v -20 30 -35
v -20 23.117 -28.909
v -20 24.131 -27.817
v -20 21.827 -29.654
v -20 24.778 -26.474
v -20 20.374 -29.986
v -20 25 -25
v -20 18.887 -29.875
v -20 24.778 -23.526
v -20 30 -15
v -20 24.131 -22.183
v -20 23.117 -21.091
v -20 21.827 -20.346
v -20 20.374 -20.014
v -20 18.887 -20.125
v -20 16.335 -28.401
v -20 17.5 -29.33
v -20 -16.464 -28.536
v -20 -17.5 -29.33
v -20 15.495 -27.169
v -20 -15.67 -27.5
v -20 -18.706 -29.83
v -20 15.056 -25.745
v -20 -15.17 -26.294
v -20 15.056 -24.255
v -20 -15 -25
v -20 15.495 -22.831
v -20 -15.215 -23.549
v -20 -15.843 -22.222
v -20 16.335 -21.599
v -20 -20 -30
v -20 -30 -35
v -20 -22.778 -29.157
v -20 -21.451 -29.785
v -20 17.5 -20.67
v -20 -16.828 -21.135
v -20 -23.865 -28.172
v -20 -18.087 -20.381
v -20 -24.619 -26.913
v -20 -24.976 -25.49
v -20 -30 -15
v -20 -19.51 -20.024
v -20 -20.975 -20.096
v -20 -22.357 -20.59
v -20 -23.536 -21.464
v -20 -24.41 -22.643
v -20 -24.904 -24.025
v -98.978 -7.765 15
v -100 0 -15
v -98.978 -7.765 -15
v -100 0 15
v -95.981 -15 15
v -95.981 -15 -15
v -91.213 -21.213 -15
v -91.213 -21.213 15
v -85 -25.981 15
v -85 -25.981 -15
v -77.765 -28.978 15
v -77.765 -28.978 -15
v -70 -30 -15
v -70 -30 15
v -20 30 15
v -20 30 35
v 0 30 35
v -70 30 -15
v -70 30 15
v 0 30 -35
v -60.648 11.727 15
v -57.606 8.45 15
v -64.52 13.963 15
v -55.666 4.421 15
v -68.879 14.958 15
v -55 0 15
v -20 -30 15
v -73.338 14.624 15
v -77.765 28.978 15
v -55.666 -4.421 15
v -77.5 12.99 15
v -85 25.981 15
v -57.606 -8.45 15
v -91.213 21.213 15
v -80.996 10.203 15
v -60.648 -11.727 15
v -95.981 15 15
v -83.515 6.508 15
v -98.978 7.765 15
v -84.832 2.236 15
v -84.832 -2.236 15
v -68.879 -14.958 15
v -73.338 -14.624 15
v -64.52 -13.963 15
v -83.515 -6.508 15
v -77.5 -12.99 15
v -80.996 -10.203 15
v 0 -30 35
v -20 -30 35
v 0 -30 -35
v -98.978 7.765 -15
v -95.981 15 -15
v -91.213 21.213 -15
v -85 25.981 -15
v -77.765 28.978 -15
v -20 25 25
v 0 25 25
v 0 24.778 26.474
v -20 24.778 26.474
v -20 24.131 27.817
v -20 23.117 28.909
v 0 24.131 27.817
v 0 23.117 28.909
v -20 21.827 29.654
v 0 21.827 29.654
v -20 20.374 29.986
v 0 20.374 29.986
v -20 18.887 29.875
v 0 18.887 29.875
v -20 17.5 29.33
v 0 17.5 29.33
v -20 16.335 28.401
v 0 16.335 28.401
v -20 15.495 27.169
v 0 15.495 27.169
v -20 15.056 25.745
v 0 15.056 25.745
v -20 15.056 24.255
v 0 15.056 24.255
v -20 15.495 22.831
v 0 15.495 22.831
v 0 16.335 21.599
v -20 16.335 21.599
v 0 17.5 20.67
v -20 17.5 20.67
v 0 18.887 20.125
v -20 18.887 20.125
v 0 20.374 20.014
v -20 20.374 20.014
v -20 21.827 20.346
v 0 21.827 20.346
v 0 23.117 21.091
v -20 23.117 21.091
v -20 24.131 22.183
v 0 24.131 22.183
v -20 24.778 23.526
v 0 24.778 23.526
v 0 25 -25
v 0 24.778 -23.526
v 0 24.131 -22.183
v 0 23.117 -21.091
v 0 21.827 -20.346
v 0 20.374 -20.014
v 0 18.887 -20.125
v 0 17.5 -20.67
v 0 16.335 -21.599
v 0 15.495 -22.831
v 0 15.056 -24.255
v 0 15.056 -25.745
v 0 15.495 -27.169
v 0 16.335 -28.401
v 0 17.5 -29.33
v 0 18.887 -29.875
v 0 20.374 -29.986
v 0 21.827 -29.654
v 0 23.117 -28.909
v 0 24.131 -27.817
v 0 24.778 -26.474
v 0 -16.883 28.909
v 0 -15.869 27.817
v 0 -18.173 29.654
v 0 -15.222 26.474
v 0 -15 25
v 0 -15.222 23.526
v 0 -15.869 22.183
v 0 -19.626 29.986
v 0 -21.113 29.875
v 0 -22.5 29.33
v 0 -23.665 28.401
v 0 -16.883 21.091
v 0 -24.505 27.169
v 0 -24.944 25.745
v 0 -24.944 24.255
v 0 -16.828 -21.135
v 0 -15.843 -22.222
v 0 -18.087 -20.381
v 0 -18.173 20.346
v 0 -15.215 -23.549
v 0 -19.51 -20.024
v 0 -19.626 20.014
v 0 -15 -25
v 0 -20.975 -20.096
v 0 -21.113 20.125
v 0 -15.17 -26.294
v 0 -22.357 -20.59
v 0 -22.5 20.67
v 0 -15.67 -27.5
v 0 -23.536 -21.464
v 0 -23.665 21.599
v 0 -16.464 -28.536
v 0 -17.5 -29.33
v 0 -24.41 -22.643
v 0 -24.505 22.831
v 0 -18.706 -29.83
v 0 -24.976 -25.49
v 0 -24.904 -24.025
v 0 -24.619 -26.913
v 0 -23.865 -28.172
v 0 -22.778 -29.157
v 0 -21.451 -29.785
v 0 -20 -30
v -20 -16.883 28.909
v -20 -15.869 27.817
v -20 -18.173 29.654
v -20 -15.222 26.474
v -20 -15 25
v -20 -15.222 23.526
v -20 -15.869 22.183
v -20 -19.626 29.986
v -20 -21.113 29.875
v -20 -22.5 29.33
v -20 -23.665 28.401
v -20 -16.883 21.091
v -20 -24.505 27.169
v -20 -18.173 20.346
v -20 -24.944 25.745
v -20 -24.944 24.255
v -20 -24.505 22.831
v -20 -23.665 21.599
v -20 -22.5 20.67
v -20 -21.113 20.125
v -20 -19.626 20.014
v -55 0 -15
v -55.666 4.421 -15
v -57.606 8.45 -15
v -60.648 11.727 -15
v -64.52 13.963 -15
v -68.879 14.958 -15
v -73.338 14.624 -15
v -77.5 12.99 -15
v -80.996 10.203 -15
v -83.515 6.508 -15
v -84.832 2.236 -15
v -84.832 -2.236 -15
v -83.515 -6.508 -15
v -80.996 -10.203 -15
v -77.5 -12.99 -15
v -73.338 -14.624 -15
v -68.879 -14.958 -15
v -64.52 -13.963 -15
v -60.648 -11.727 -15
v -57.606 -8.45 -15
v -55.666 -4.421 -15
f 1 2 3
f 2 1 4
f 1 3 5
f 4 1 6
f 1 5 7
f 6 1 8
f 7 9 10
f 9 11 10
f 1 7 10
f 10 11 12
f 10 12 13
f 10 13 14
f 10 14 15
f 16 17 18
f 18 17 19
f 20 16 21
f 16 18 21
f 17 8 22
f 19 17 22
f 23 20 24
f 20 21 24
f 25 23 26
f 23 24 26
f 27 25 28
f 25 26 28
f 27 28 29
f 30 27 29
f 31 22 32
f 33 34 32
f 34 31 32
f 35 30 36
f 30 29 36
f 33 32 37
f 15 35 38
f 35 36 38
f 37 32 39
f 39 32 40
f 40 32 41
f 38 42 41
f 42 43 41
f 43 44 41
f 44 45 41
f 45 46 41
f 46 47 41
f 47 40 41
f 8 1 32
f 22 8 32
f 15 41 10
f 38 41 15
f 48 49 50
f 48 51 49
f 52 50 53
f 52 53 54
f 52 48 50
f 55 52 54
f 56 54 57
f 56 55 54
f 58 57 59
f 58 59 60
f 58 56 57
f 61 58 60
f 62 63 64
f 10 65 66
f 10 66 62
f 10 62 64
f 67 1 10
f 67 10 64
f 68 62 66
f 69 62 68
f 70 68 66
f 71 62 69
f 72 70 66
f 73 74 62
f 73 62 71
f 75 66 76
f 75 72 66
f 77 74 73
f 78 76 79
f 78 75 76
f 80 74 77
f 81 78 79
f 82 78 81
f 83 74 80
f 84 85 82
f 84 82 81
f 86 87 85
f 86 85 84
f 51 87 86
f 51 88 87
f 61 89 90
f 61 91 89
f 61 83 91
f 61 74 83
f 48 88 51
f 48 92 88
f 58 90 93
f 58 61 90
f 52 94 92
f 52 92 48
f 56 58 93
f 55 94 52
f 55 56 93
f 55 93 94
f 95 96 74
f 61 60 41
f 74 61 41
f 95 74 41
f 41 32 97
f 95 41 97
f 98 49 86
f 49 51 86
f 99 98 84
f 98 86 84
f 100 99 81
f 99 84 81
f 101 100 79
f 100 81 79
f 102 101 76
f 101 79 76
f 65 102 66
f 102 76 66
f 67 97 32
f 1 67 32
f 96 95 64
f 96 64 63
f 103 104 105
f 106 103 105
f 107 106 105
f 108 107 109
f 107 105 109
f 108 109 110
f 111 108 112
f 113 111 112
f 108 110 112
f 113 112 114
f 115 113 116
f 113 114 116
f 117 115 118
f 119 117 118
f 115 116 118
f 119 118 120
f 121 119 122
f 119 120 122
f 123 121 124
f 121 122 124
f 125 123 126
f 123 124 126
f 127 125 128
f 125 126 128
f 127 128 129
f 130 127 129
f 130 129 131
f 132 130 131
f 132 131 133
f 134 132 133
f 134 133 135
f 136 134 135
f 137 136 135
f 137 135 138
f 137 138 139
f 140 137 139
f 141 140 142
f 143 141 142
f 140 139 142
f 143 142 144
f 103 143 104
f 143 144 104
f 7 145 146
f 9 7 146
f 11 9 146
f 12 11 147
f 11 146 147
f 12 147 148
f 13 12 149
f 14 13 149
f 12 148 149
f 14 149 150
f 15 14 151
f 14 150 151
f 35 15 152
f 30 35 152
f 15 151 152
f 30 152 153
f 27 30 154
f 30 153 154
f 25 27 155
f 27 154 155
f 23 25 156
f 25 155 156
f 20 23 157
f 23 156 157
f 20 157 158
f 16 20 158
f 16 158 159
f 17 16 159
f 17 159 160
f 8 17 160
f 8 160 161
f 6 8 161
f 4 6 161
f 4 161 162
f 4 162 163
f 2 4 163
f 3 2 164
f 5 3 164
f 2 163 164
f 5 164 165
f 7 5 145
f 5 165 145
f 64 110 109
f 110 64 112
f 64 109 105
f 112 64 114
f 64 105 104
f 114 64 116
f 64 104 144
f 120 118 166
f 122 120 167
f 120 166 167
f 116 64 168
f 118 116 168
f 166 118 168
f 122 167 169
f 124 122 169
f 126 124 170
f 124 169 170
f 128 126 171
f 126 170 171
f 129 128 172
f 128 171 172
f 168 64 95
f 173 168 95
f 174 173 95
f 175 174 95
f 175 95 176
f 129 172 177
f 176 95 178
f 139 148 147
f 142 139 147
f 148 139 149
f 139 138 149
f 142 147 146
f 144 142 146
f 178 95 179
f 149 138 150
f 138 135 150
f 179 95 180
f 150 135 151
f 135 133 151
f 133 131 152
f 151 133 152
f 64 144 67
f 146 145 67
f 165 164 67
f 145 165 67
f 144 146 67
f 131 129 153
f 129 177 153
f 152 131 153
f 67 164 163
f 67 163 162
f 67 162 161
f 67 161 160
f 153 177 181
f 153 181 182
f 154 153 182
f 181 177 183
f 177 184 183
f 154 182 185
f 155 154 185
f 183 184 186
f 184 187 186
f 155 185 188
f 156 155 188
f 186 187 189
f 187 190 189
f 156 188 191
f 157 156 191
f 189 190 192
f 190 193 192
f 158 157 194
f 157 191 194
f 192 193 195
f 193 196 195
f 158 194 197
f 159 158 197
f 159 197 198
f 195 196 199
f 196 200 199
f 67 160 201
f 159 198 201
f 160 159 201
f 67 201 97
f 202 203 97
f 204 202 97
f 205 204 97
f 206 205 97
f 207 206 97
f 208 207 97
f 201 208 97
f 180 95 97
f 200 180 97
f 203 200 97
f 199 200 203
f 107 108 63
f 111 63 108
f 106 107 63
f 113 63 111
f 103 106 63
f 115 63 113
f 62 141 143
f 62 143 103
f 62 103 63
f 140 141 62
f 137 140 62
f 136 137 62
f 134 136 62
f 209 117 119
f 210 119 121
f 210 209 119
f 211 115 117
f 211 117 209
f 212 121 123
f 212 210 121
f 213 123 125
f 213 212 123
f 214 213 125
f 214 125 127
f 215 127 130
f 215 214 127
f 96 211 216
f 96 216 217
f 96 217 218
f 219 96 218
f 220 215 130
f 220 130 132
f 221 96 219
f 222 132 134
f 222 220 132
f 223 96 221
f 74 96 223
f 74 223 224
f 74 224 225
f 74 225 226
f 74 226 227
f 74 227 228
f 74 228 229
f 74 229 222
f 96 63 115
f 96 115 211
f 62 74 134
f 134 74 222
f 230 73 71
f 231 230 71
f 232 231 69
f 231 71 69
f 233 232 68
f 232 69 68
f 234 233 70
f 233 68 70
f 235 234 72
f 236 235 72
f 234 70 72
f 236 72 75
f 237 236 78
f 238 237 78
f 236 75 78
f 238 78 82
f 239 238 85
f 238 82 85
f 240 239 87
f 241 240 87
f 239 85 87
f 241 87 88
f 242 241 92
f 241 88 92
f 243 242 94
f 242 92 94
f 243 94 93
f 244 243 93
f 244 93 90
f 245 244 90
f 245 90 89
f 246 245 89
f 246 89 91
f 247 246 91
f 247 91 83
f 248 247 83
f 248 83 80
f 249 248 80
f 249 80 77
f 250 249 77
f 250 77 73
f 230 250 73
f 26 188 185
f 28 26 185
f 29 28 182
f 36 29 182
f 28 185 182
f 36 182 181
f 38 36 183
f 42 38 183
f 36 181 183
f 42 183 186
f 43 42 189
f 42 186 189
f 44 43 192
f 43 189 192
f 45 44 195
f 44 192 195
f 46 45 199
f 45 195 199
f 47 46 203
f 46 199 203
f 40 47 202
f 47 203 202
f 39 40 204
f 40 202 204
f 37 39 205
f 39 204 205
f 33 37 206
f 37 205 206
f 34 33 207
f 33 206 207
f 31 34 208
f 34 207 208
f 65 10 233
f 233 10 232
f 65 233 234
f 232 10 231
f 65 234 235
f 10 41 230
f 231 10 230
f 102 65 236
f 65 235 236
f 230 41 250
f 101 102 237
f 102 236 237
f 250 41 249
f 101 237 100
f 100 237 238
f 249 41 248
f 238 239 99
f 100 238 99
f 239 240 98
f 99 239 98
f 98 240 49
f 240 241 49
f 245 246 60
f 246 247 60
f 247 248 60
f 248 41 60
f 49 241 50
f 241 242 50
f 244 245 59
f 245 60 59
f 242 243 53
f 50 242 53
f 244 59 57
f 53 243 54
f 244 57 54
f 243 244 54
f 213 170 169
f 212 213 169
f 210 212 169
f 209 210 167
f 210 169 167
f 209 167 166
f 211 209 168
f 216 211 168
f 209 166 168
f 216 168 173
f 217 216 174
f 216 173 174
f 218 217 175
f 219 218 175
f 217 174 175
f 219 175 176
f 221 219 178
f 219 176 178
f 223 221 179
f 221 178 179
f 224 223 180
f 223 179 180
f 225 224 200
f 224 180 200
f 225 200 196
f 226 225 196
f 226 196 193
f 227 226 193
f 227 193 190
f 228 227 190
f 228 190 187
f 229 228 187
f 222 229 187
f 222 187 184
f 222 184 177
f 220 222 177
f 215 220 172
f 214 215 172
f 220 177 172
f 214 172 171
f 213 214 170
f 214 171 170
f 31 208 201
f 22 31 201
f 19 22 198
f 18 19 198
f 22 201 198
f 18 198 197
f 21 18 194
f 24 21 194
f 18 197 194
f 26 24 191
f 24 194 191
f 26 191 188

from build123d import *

# Parameters (mm, degrees)
F1_DEPTH = 30
F2_R     = 29.99999
F3_R     = 15
F4_DEPTH = 15
F6_R     = 5
F7_DEPTH = 20


# Not quite as in the source:
# - a fillet or chamfer is up to 0.001 mm smaller than in the source, because OpenCascade refuses the exact size


with BuildPart() as f1:
    # F0 (on Front) → F1 (new body, symmetric)
    with BuildSketch(Plane.XZ):
        Polygon((-100, 0), (0, 0), (0, 35), (-20, 35), (-20, 15), (-100, 15), align=None)
    extrude(amount=F1_DEPTH, both=True)

    # F2 (radius 30 in the source; OpenCascade refuses exactly that, so slightly less here)
    f2_edges = [f1.edges().sort_by_distance(p)[0] for p in [
        (-100, -30, 7.5),
        (-100, 30, 7.5),
    ]]
    fillet(f2_edges, radius=F2_R)

    # F3 (on face) → F4 (cut, through all)
    with BuildSketch(Plane.XY.offset(15)):
        with Locations((-70, 0)):
            Circle(F3_R)
    extrude(amount=-F4_DEPTH, mode=Mode.SUBTRACT)

    # F5: F1 across plane


with BuildPart() as f1_1:
    add(f1.part)
    add(f1.part.mirror(Plane.XY))

    # F6 (on face) → F7 (cut, through all)
    with BuildSketch(Plane.YZ):
        with BuildLine():
            ThreePointArc((-20, -30), (-16.4644660941, -28.5355339059), (-15, -25))
            ThreePointArc((-15, -25), (-23.5355339059, -21.4644660941), (-20, -30))
        make_face()
        with Locations((-20, 25)):
            Circle(F6_R)
        with Locations((20, -25)):
            Circle(F6_R)
        with Locations((20, 25)):
            Circle(F6_R)
    extrude(amount=-F7_DEPTH, mode=Mode.SUBTRACT)


solid = f1_1.part
